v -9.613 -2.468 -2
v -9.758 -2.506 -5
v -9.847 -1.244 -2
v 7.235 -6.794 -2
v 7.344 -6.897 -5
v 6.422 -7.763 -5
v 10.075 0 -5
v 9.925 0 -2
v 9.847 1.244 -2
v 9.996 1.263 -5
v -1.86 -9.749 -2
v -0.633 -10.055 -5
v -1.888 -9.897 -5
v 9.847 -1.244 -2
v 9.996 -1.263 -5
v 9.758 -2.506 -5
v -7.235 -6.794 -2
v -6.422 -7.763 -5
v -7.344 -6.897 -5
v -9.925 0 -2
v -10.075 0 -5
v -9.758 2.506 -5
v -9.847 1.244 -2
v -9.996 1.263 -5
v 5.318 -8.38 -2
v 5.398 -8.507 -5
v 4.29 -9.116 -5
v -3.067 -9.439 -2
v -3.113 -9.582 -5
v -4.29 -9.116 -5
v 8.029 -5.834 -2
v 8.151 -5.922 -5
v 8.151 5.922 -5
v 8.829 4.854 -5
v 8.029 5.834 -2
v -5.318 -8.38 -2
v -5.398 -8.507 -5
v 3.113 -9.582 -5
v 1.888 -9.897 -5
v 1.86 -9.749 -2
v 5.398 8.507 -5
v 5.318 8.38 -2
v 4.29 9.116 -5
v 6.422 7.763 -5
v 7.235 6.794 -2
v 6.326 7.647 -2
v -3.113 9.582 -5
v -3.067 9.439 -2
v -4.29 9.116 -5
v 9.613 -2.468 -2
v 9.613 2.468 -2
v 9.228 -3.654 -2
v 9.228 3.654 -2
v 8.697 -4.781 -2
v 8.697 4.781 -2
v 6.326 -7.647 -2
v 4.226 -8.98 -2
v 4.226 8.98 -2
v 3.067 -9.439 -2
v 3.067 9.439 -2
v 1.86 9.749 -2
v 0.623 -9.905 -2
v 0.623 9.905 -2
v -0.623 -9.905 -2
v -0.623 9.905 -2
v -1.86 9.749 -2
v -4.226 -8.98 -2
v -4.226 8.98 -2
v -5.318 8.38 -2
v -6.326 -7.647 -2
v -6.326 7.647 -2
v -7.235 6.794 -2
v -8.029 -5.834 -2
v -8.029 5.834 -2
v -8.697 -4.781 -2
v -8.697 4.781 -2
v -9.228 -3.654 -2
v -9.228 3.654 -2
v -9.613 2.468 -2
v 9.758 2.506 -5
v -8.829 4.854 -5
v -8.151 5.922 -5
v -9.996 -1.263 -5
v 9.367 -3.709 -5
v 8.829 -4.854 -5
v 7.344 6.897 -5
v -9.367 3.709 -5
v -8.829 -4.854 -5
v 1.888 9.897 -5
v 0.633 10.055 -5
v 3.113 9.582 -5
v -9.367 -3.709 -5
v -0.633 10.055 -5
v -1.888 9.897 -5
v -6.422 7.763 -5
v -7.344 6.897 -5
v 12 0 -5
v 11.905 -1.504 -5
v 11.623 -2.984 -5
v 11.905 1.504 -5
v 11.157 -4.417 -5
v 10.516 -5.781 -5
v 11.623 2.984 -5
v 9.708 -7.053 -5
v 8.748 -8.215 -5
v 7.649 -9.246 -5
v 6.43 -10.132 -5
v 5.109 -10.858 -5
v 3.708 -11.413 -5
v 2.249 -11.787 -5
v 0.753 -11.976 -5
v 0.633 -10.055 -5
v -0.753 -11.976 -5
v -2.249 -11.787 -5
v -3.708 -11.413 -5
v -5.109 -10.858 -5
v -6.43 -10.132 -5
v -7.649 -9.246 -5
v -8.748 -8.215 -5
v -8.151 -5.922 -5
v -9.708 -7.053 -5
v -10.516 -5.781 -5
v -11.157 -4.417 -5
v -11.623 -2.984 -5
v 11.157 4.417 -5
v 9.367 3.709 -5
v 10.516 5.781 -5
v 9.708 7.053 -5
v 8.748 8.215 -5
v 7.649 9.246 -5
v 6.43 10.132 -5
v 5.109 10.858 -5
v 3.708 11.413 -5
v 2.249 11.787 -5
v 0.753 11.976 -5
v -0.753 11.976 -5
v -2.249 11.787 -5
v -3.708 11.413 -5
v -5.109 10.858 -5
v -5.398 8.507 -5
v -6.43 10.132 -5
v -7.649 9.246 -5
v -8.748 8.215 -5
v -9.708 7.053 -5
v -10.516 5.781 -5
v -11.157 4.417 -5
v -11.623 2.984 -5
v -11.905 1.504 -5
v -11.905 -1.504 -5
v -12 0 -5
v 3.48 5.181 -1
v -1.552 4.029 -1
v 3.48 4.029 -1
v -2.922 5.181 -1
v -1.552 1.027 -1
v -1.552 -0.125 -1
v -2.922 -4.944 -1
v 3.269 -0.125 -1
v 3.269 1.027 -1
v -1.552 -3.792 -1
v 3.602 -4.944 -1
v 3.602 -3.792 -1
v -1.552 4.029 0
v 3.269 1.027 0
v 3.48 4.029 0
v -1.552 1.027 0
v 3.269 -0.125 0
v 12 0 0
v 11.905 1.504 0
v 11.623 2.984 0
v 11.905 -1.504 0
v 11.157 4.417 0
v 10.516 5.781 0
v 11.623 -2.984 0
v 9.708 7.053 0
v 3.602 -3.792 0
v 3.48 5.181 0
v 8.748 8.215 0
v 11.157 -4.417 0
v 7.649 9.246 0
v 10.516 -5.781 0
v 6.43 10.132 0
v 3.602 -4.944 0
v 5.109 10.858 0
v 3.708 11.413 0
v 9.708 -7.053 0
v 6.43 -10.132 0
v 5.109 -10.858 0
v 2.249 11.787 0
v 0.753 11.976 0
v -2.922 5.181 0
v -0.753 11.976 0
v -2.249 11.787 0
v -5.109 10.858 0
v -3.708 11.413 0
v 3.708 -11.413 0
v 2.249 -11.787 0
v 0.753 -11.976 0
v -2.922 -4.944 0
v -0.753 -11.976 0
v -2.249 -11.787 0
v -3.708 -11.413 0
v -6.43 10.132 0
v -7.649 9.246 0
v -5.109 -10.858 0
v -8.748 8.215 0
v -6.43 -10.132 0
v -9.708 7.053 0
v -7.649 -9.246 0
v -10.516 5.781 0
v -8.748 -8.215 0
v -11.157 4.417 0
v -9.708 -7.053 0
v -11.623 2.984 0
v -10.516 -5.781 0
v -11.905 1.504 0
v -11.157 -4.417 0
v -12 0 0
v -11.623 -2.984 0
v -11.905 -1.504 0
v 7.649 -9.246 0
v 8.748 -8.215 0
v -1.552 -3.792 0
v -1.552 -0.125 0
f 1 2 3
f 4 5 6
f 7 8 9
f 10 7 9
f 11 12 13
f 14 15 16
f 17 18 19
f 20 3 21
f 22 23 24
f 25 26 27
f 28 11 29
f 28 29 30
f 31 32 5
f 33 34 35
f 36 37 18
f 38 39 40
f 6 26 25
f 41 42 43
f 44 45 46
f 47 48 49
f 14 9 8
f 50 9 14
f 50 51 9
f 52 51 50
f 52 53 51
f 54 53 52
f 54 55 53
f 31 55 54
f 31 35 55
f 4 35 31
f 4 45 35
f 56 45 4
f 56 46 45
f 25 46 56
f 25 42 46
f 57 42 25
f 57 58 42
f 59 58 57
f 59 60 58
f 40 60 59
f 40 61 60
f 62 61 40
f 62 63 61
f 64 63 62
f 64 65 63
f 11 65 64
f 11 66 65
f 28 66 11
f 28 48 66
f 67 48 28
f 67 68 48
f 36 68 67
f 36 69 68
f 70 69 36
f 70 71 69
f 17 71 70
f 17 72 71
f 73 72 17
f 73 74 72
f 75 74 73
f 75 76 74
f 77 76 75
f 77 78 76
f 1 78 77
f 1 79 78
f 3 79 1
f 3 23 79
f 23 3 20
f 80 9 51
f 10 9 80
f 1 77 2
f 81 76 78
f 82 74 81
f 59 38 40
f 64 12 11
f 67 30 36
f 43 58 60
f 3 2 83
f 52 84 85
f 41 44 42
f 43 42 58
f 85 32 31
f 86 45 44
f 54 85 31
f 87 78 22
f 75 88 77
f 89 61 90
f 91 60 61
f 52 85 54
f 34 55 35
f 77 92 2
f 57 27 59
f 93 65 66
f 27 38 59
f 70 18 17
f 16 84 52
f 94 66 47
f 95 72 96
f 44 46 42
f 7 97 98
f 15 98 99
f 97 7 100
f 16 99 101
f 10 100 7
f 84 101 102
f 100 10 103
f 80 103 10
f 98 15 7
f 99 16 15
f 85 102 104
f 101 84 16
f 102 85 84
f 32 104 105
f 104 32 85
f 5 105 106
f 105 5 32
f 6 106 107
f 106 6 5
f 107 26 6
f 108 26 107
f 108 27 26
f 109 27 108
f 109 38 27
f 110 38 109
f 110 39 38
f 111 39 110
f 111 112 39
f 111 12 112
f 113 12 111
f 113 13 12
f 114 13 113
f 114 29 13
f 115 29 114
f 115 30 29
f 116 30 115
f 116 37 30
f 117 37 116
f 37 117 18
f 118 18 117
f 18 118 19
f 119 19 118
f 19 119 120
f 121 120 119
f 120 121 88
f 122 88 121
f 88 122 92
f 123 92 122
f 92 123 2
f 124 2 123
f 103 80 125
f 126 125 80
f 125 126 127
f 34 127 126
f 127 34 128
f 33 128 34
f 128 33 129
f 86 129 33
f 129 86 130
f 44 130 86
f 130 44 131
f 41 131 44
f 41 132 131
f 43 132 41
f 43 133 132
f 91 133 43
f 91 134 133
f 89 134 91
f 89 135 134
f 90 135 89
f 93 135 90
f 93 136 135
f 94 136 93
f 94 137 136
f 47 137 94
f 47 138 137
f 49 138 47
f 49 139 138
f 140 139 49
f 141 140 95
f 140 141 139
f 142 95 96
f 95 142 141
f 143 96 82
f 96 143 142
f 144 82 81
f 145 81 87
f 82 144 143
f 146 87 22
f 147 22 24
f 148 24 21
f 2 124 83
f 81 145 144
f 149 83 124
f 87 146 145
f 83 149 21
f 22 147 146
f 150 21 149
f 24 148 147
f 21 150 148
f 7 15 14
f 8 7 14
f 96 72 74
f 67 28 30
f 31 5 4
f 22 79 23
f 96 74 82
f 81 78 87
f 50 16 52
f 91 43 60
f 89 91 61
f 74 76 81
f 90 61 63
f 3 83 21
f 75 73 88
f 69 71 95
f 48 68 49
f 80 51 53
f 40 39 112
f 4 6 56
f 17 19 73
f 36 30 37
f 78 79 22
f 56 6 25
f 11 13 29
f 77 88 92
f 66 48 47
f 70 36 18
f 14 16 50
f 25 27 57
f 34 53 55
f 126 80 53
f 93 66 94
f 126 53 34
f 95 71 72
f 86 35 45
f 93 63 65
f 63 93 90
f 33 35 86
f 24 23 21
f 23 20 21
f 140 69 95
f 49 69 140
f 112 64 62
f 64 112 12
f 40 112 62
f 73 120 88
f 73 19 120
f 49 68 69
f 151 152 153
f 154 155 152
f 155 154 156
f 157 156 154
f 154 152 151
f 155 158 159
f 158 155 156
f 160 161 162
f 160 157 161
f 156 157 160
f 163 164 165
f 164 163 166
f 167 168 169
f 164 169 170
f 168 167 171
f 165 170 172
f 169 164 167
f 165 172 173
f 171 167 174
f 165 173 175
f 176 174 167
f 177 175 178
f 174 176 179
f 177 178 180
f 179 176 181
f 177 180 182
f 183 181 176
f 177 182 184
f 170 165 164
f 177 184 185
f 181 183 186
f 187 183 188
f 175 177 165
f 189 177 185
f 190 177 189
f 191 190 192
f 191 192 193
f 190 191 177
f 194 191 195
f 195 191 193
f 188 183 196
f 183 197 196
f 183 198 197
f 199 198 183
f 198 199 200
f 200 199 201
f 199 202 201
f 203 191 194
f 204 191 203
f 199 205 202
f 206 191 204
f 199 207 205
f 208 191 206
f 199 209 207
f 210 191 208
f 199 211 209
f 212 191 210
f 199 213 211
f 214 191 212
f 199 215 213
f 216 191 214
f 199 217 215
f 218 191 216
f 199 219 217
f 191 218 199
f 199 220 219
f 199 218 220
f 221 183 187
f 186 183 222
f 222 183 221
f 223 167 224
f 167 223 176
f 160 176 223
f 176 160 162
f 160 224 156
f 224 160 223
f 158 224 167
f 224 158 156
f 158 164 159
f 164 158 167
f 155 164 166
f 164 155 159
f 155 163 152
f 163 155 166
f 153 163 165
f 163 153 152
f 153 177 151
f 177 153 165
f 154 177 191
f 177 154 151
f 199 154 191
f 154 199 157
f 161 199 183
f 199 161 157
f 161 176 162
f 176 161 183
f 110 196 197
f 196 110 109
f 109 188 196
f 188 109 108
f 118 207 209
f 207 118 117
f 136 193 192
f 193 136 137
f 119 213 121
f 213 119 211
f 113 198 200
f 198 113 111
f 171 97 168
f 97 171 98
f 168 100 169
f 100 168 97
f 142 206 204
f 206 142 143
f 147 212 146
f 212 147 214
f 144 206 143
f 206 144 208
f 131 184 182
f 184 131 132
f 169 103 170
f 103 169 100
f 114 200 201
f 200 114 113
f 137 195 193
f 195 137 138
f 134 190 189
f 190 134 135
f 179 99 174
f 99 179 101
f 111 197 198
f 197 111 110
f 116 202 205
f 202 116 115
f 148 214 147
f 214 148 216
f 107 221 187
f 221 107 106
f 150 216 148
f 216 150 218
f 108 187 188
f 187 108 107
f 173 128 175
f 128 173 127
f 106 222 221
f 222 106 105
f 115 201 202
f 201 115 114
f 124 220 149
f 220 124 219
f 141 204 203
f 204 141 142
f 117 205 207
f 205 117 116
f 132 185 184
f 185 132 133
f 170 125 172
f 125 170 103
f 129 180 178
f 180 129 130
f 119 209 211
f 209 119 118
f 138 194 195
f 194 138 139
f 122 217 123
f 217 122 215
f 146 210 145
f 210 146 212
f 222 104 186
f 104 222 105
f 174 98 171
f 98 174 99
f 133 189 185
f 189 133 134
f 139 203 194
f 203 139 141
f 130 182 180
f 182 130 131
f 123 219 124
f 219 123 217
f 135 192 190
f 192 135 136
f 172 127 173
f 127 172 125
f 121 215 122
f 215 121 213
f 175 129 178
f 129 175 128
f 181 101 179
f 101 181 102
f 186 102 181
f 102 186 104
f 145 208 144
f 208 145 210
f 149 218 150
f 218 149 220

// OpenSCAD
$fn = 50;


difference() {
	union() {
		translate(v = [0, 0, -5.0000000000]) {
			cylinder(h = 5, r = 12.0000000000);
		}
	}
	union() {
		#translate(v = [0, 0, -5.0000000000]) {
			cylinder(h = 3, r1 = 10.0750000000, r2 = 9.9250000000);
		}
		translate(v = [0, 0, -1]) {
			linear_extrude(height = 1) {
				text(font = "Impact", halign = "center", size = 10, text = "E", valign = "center");
			}
		}
	}
}
